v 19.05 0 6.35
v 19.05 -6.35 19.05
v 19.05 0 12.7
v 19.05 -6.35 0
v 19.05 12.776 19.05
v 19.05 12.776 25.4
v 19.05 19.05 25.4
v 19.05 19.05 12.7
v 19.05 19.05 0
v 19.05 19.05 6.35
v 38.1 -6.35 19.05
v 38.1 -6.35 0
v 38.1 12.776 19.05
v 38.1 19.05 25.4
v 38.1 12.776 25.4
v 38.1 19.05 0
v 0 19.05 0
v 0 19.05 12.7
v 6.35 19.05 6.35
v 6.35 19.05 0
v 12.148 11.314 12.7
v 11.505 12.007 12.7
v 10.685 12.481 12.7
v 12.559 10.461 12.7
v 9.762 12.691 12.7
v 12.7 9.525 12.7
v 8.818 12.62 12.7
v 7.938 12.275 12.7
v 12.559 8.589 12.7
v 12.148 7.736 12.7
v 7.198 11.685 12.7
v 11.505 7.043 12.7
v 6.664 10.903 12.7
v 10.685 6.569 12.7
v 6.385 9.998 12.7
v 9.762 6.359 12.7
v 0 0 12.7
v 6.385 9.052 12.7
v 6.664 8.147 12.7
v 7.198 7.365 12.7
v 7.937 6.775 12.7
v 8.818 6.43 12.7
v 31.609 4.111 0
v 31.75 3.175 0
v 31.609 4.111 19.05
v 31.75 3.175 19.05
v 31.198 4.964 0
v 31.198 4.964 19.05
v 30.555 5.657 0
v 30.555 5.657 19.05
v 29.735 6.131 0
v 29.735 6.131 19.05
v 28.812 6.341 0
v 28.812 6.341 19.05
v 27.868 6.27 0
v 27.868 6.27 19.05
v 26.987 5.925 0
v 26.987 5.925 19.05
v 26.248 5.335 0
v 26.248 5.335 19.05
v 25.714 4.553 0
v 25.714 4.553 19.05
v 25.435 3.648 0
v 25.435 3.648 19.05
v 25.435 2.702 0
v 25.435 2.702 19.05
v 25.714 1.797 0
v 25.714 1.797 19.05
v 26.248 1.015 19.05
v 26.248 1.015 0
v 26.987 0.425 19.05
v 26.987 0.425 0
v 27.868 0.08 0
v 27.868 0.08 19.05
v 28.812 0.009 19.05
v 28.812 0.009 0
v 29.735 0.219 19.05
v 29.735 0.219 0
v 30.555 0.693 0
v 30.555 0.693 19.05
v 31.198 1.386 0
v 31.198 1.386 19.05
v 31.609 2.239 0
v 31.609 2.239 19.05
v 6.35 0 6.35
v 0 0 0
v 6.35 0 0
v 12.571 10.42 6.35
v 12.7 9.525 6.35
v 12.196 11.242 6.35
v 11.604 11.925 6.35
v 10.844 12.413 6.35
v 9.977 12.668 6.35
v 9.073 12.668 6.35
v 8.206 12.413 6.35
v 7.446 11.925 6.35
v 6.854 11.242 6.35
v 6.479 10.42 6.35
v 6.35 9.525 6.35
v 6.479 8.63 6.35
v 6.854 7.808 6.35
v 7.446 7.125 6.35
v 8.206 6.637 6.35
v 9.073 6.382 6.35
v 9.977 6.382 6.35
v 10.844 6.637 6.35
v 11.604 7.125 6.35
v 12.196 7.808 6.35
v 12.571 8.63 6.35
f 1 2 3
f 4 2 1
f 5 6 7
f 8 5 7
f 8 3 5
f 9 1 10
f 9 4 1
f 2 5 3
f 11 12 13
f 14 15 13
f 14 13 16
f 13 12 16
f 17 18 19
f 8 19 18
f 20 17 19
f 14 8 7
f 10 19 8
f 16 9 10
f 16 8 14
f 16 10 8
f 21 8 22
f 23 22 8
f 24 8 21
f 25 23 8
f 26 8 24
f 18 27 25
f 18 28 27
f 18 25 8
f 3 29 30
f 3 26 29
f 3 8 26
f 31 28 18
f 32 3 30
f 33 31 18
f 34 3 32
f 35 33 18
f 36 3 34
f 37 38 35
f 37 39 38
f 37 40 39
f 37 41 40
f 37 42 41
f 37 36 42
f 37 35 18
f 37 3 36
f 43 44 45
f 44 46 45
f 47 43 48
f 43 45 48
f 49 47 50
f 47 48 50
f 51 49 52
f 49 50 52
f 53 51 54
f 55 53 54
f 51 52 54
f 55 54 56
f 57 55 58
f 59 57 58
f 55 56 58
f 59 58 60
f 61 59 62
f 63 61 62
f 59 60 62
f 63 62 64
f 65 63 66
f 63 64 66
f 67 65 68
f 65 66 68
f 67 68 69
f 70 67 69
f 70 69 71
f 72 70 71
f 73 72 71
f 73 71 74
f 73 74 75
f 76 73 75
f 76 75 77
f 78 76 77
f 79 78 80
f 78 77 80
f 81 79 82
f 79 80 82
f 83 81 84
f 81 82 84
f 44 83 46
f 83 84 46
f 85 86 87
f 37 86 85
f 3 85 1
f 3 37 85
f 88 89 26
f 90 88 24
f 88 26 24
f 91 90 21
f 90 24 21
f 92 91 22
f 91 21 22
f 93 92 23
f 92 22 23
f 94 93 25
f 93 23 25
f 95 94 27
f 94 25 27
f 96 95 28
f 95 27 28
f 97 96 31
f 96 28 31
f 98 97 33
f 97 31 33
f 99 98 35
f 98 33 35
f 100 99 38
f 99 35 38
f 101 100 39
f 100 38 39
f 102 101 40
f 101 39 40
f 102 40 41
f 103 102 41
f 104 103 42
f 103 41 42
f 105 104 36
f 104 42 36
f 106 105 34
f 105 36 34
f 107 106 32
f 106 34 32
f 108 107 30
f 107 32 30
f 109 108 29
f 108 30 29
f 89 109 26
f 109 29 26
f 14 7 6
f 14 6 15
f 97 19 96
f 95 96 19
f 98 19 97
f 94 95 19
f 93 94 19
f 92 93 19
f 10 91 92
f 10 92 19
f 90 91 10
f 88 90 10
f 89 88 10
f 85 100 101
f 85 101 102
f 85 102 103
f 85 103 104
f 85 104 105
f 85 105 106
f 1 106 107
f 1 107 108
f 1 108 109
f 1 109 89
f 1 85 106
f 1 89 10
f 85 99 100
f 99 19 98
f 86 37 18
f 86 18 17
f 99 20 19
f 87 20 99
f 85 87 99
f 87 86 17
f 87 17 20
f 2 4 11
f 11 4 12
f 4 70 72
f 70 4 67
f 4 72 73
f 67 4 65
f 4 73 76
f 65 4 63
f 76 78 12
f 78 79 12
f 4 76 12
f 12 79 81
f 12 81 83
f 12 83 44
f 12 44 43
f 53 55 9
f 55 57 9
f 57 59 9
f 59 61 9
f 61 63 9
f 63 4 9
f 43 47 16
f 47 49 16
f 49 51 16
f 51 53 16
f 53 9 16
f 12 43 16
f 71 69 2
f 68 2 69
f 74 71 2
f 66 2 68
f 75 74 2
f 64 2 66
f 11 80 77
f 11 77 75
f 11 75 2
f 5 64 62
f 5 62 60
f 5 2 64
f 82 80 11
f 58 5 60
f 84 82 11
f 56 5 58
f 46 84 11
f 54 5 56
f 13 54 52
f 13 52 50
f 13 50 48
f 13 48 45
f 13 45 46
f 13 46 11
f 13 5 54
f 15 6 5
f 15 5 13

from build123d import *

# Parameters (mm, degrees)
F1_DEPTH = 19.05
F2_W     = 19.05
F2_H     = 25.4
F3_DEPTH = 25.4
F4_W     = 19.05
F4_H     = 19.1262
F5_DEPTH = 6.35
F6_R     = 3.175
F7_DEPTH = 12.7


with BuildPart() as f1:
    # F0 (on Front) → F1 (new body)
    with BuildSketch(Plane.XZ):
        Polygon((0, 12.7), (0, 0), (6.35, 0), (6.35, 6.35), (19.05, 6.35), (19.05, 12.7), align=None)
    extrude(amount=-F1_DEPTH)

    # F2 (on Top) → F3 (join)
    with BuildSketch(Plane.XY):
        with Locations((28.575, 6.35)):
            Rectangle(F2_W, F2_H)
    extrude(amount=F3_DEPTH)

    # F4 (on face) → F5 (cut)
    with BuildSketch(Plane.XY.offset(25.4)):
        with Locations((28.575, 3.2131)):
            Rectangle(F4_W, F4_H)
    extrude(amount=-F5_DEPTH, mode=Mode.SUBTRACT)

    # F6 (on face) → F7 (cut, symmetric)
    with BuildSketch(Plane.XY.offset(12.7)):
        with Locations((28.575, 3.175)):
            Circle(F6_R)
        with Locations((9.525, 9.525)):
            Circle(F6_R)
    extrude(amount=F7_DEPTH, both=True, mode=Mode.SUBTRACT)


solid = f1.part
